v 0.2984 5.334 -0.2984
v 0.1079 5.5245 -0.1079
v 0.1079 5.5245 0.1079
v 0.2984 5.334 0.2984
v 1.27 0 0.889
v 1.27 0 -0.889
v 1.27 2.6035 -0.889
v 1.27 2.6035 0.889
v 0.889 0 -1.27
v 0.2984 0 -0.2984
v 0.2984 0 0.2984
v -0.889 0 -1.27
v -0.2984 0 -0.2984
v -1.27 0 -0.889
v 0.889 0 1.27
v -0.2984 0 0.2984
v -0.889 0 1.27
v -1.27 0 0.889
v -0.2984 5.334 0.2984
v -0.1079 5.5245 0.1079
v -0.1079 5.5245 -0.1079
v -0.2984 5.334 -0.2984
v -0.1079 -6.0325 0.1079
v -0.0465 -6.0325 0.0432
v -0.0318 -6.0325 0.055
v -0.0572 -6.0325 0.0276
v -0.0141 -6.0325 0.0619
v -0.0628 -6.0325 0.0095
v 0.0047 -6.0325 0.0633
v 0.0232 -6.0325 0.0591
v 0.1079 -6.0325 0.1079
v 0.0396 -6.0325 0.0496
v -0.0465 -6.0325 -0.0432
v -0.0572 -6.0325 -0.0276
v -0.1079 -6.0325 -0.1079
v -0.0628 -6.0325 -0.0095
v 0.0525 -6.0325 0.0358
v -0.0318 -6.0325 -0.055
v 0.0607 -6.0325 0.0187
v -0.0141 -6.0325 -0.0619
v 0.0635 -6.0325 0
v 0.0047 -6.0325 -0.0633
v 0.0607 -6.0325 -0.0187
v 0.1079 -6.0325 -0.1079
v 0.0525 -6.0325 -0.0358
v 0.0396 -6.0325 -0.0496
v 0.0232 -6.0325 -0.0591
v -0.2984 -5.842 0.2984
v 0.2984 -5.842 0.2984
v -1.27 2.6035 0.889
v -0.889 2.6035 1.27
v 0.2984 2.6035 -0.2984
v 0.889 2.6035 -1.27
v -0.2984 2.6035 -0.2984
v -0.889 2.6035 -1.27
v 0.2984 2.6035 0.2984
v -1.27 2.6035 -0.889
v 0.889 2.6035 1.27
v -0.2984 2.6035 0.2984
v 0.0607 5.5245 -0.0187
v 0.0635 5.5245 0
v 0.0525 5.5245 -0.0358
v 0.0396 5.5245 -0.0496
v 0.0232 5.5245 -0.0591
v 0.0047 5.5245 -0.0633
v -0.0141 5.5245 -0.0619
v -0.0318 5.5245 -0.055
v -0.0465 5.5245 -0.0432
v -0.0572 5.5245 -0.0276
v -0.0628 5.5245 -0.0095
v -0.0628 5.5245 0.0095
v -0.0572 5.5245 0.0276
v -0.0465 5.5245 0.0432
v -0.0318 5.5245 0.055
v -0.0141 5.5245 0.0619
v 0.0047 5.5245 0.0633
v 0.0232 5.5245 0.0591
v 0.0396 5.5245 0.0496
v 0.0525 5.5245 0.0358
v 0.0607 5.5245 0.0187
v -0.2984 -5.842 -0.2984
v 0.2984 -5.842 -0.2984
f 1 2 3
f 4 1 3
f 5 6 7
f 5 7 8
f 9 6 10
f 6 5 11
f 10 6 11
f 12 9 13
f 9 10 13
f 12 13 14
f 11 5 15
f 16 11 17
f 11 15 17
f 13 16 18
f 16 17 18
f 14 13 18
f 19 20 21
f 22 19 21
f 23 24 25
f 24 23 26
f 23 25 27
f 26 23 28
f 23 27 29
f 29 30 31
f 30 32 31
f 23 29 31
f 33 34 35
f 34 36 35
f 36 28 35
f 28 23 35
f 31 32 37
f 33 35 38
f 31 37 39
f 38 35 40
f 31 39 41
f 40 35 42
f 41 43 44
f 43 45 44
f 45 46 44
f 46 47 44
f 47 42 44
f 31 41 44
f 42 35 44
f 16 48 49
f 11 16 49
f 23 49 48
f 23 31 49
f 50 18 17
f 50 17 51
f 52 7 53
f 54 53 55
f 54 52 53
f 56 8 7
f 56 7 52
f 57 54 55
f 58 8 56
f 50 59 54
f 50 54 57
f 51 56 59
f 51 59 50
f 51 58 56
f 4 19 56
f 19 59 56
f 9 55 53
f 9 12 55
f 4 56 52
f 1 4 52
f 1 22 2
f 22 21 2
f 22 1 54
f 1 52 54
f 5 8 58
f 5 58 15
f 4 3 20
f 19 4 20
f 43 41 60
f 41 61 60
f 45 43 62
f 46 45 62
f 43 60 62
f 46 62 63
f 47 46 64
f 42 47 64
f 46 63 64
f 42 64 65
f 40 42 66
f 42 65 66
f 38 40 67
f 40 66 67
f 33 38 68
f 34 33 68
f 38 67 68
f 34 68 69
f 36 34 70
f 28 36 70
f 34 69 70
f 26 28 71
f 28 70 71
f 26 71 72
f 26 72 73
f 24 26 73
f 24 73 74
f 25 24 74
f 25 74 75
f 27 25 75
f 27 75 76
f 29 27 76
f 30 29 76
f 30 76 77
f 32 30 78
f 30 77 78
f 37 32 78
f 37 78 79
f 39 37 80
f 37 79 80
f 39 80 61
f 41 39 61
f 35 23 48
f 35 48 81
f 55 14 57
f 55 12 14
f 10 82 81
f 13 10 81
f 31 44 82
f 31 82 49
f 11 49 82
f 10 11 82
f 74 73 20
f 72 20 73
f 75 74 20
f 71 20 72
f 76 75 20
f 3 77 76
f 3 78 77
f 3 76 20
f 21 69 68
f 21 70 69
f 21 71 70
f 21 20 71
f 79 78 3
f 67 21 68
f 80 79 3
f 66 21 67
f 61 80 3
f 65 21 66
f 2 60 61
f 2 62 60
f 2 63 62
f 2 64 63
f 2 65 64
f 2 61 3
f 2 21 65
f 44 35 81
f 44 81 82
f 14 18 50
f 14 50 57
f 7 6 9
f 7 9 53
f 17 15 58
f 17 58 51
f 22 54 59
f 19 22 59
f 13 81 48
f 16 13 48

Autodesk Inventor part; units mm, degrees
ref_plane "YZ Plane" through (0, 0, 0) normal (1, 0, 0) x (0, 1, 0)
ref_plane "XZ Plane" through (0, 0, 0) normal (0, 1, 0) x (-1, 0, 0)
ref_plane "XY Plane" through (0, 0, 0) normal (0, 0, 1) x (1, 0, 0)
sketch "Sketch1" plane through (0, 0, 0) normal (0, 1, 0) x (-1, 0, 0)
  line L0 (-1.27, 1.27) -> (1.27, 1.27)
  line L1 (1.27, 1.27) -> (1.27, -1.27)
  line L2 (1.27, -1.27) -> (-1.27, -1.27)
  line L3 (-1.27, -1.27) -> (-1.27, 1.27)
  line L4 (-1.27, 1.27) -> (1.27, -1.27) construction
  line L5 (1.27, 1.27) -> (-1.27, -1.27) construction
  point P0 (0, 0)
  dimension "d0" = 2.54
extrude "Extrusion1" add sketch "Sketch1" along normal blind 2.6035
chamfer "Chamfer1" distance 0.381 angle 45 4 edges at (1.27, 1.3017, 1.27) (-1.27, 1.3017, 1.27) (1.27, 1.3017, -1.27) (-1.27, 1.3017, -1.27)
sketch "Sketch2" plane through (0, 2.6035, 0) normal (0, 1, 0) x (1, 0, 0)
  line L0 (0.2984, 0.2984) -> (-0.2984, 0.2984)
  line L1 (-0.2984, 0.2984) -> (-0.2984, -0.2984)
  line L2 (-0.2984, -0.2984) -> (0.2984, -0.2984)
  line L3 (0.2984, -0.2984) -> (0.2984, 0.2984)
  line L4 (0.2984, 0.2984) -> (-0.2984, -0.2984) construction
  line L5 (-0.2984, 0.2984) -> (0.2984, -0.2984) construction
  point P0 (0, 0)
  dimension "d6" = 0.5969
extrude "Extrusion2" add sketch "Sketch2" along normal blind 2.921 and the other way blind 8.636
chamfer "Chamfer2" distance 0.1905 angle 45 8 edges at (0.2984, 5.5245, 0) (0, 5.5245, -0.2984) (-0.2984, 5.5245, 0) (0, 5.5245, 0.2984) (0, -6.0325, -0.2984) (0.2984, -6.0325, 0) (0, -6.0325, 0.2984) (-0.2984, -6.0325, 0)
sketch "Sketch3" plane through (0, 5.5245, 0) normal (0, 1, 0) x (1, 0, 0)
  circle A0 centre (0, 0) radius 0.0635
  dimension "d14" = 0.127
extrude "Extrusion3" cut sketch "Sketch3" against normal through all
properties part number "Single Short Male Header"
